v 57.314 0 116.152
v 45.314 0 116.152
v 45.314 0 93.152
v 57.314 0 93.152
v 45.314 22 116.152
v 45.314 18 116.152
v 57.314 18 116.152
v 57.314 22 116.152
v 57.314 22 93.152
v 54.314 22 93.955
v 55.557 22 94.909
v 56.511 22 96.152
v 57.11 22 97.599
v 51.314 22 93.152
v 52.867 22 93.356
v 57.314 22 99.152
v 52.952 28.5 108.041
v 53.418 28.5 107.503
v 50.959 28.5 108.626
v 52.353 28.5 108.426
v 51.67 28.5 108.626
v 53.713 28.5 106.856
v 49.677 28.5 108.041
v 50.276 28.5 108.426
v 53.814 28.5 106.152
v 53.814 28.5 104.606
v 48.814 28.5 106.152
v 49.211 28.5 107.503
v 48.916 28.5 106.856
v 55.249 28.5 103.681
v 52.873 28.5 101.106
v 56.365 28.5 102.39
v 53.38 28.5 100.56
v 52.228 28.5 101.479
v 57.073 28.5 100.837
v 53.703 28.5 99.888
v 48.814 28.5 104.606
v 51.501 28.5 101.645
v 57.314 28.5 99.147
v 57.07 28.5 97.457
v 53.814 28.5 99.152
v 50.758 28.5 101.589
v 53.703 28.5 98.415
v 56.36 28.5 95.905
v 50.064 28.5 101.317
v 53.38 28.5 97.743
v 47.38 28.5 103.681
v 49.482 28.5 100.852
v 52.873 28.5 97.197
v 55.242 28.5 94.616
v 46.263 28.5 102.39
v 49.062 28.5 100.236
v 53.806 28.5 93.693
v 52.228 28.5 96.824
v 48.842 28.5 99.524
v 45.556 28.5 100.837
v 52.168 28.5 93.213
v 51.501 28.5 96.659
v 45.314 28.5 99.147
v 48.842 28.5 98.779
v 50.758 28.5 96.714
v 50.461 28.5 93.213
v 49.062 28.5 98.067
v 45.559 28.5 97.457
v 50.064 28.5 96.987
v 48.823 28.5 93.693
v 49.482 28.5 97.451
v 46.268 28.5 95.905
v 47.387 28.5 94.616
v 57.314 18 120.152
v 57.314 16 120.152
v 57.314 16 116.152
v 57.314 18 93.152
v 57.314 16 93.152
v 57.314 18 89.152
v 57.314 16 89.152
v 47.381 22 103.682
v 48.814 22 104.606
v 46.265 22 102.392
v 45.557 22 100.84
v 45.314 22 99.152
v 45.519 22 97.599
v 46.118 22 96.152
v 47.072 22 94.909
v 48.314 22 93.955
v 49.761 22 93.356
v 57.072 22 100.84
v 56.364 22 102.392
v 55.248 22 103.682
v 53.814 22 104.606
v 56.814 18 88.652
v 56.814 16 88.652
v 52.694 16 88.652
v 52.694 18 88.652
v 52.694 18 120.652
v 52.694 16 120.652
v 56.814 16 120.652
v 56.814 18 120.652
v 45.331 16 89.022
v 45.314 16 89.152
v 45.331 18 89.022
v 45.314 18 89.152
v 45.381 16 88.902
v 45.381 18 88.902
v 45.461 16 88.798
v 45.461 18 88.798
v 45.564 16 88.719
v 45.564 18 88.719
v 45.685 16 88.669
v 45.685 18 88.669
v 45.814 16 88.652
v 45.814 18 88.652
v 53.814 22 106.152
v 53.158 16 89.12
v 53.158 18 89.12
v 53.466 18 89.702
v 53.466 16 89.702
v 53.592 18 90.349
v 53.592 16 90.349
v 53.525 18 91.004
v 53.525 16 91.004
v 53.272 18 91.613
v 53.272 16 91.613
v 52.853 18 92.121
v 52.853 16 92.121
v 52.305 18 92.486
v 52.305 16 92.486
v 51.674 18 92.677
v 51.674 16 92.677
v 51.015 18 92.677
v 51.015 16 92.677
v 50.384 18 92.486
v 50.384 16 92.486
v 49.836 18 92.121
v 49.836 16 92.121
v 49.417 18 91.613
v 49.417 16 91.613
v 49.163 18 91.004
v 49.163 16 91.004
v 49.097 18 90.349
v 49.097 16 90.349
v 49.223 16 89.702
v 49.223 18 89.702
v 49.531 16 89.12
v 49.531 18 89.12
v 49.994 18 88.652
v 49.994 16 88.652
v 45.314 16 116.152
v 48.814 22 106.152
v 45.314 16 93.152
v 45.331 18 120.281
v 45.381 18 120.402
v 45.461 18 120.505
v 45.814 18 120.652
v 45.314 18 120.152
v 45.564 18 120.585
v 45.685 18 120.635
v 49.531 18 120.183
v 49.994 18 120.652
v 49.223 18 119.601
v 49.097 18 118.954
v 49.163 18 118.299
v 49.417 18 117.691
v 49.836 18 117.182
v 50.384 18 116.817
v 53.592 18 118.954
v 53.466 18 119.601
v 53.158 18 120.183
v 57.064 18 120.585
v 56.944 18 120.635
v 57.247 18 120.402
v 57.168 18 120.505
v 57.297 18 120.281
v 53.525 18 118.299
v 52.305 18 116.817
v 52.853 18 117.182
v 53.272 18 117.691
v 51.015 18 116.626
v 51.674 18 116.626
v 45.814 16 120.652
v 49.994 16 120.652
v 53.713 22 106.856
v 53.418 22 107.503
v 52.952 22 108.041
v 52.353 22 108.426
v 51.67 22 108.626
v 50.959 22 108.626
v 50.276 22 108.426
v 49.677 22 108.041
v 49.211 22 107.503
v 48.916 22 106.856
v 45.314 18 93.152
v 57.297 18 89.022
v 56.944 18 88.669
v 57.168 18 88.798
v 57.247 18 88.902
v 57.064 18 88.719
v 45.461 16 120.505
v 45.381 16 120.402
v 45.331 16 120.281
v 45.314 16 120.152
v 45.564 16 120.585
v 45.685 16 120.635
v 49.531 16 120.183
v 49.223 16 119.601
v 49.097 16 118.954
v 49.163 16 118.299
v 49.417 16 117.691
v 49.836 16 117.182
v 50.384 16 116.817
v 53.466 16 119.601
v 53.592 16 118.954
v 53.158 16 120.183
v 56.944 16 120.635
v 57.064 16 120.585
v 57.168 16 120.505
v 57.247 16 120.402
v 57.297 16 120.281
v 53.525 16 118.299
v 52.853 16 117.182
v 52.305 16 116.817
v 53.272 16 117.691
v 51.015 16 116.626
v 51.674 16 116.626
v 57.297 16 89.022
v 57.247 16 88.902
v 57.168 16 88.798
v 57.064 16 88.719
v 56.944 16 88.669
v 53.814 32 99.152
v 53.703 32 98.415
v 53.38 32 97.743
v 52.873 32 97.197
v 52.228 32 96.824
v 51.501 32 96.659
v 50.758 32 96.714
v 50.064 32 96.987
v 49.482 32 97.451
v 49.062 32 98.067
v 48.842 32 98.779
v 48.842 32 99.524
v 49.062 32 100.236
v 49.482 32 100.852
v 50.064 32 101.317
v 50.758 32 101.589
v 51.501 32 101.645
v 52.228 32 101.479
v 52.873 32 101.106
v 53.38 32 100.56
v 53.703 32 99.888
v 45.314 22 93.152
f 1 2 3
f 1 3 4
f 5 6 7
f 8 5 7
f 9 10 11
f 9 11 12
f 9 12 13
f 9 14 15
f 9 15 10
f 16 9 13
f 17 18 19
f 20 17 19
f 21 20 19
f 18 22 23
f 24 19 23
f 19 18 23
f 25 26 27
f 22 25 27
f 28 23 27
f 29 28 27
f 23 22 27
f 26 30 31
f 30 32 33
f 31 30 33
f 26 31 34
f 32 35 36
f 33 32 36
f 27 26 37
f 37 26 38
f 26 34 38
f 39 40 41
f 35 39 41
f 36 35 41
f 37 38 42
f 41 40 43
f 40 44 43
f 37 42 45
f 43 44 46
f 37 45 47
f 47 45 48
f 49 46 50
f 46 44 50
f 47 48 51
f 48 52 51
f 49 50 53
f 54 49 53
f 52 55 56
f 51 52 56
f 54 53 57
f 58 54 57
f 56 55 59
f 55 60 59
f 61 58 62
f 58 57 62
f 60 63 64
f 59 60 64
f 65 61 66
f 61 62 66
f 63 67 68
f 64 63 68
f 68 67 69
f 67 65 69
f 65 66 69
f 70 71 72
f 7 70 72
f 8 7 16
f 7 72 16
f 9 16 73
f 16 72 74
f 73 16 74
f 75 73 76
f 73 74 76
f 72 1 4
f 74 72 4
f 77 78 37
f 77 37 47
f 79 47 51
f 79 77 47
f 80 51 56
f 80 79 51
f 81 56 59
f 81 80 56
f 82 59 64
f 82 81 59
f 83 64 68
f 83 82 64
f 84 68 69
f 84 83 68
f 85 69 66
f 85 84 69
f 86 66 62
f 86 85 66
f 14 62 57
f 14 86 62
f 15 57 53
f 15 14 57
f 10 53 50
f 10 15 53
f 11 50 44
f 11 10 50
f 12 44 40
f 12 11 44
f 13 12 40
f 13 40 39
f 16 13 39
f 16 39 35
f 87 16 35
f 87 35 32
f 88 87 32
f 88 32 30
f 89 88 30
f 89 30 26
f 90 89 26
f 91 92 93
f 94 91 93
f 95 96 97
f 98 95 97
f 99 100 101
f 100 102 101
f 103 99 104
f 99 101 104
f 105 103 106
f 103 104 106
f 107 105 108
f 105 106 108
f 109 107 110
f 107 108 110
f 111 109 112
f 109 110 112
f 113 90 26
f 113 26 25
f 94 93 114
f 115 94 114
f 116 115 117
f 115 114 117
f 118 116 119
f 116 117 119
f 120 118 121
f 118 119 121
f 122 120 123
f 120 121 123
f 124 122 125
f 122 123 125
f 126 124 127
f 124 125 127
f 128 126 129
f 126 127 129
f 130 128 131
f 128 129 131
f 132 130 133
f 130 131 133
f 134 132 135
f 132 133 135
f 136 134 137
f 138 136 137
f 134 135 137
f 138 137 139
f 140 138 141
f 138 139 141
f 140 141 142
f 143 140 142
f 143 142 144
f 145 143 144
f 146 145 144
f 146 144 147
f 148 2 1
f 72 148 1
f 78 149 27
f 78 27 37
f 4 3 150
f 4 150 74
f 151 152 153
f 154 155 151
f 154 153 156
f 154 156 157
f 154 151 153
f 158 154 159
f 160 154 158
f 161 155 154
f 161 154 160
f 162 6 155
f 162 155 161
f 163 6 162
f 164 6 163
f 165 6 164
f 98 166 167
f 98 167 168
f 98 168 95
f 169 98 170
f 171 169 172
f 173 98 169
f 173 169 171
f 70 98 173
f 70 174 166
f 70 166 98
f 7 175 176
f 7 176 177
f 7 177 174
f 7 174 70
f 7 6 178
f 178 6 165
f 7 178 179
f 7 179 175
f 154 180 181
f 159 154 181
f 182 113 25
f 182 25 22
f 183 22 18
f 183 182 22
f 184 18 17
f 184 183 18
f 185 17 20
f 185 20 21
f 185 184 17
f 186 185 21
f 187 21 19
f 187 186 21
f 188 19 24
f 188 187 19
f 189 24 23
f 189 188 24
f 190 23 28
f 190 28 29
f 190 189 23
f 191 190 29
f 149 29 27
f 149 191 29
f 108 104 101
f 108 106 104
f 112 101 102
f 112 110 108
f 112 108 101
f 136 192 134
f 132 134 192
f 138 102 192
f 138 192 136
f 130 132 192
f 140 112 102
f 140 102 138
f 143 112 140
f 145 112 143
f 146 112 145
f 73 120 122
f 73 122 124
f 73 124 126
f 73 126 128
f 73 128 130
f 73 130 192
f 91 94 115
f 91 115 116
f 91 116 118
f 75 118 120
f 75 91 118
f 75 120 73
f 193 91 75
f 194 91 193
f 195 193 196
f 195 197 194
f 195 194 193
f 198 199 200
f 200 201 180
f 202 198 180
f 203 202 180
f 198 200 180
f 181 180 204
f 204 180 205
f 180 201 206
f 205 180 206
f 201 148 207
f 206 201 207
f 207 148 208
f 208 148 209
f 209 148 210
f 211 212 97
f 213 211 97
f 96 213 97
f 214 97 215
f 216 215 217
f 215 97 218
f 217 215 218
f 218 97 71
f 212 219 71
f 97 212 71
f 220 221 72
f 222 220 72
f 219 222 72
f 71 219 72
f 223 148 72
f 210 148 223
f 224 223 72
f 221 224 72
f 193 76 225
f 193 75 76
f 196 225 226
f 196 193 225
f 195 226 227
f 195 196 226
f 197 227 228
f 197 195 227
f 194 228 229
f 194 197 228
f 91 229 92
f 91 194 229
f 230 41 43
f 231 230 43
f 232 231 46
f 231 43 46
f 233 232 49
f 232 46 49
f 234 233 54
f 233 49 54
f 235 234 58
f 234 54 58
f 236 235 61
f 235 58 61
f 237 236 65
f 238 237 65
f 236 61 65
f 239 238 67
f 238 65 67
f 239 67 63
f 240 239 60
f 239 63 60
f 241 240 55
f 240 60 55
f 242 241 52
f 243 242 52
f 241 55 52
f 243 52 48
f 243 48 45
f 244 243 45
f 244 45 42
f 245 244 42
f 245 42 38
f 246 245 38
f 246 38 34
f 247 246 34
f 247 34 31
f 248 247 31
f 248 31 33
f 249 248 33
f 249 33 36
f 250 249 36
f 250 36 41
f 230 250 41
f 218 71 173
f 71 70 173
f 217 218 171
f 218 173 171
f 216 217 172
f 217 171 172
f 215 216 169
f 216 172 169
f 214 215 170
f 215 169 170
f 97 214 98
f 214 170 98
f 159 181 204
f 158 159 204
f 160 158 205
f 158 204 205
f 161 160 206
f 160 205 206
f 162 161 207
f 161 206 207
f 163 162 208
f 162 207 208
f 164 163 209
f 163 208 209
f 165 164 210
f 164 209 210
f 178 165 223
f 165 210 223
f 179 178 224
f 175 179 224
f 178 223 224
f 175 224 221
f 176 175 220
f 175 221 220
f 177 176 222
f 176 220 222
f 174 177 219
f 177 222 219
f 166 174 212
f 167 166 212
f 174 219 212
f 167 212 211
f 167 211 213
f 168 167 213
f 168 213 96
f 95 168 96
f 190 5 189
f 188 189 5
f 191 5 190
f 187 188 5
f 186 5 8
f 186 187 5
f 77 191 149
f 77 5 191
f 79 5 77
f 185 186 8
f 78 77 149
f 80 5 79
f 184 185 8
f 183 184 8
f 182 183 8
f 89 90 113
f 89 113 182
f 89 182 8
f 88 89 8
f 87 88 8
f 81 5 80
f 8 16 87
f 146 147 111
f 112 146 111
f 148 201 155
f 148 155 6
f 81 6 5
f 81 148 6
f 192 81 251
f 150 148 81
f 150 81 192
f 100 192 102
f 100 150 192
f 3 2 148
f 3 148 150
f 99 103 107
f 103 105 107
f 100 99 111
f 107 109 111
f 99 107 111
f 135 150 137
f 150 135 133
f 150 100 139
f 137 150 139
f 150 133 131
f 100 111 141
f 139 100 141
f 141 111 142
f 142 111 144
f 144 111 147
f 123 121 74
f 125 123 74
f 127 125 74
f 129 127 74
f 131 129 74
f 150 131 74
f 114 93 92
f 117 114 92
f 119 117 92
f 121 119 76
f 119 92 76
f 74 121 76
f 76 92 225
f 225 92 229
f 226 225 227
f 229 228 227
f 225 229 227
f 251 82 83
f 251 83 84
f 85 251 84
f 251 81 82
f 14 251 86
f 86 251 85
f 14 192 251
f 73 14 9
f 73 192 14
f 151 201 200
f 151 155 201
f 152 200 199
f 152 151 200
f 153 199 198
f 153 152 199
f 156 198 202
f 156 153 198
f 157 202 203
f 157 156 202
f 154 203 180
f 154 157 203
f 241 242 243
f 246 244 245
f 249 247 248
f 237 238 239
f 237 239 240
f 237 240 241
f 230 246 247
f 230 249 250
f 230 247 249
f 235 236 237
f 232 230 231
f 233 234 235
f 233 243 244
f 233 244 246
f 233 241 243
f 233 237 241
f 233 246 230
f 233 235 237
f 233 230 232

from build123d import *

# Parameters (mm, degrees)
SKETCH4_R           = 2.5
BOSS_EXTRUDE2_DEPTH = 32
BOSS_EXTRUDE3_DEPTH = 28.5
SKETCH1_W           = 12
SKETCH1_H           = 23
BOSS_EXTRUDE4_DEPTH = 22
BOSS_EXTRUDE6_DEPTH = 2
FILLET2_R           = 0.5


with BuildPart() as part:
    # Sketch4 → Boss-Extrude2 (new body)
    with BuildSketch(Plane(origin=(0, 0, 0), x_dir=(1, 0, 0), z_dir=(0, 1, 0))):
        with Locations((51.314367453, -99.151596437)):
            Circle(SKETCH4_R)
    extrude(amount=BOSS_EXTRUDE2_DEPTH)

    # Sketch3 → Boss-Extrude3 (add)
    with BuildSketch(Plane(origin=(0, 0, 0), x_dir=(1, 0, 0), z_dir=(0, 1, 0))):
        with BuildLine():
            Line((48.814367453, -106.151596437), (48.814367453, -104.605952495))
            ThreePointArc((48.814367453, -104.605952495), (51.314367453, -93.151596437), (53.814367453, -104.605952495))
            Line((53.814367453, -104.605952495), (53.814367453, -106.151596437))
            ThreePointArc((53.814367453, -106.151596437), (51.314367453, -108.651596437), (48.814367453, -106.151596437))
        make_face()
    extrude(amount=BOSS_EXTRUDE3_DEPTH)

    # Sketch1 → Boss-Extrude4 (add)
    with BuildSketch(Plane(origin=(0, 0, 0), x_dir=(1, 0, 0), z_dir=(0, 1, 0))):
        with Locations((51.314367453, -104.651596437)):
            Rectangle(SKETCH1_W, SKETCH1_H)
    extrude(amount=BOSS_EXTRUDE4_DEPTH)

    # Sketch7 → Boss-Extrude6 (add)
    with BuildSketch(Plane(origin=(0, 16, 0), x_dir=(1, 0, 0), z_dir=(0, 1, 0))):
        with BuildLine():
            Line((52.694479243, -120.651596437), (57.314367453, -120.651596437))
            Line((57.314367453, -120.651596437), (57.314367453, -116.151596437))
            Line((57.314367453, -116.151596437), (45.314367453, -116.151596437))
            Line((45.314367453, -116.151596437), (45.314367453, -120.651596437))
            Line((45.314367453, -120.651596437), (49.994479243, -120.651596437))
            ThreePointArc((49.994479243, -120.651596437), (51.344479243, -116.601596437), (52.694479243, -120.651596437))
        make_face()
        with BuildLine():
            Line((45.314367453, -93.151596437), (57.314367453, -93.151596437))
            Line((57.314367453, -93.151596437), (57.314367453, -88.651596437))
            Line((57.314367453, -88.651596437), (52.694479243, -88.651596437))
            ThreePointArc((52.694479243, -88.651596437), (51.344479243, -92.701596437), (49.994479243, -88.651596437))
            Line((49.994479243, -88.651596437), (45.314367453, -88.651596437))
            Line((45.314367453, -88.651596437), (45.314367453, -93.151596437))
        make_face()
    extrude(amount=BOSS_EXTRUDE6_DEPTH)

    # Fillet2
    fillet2_edges = [part.edges().sort_by_distance(p)[0] for p in [
        (45.314367453, 17, 120.651596437),
        (57.314367453, 17, 120.651596437),
        (45.314367453, 17, 88.651596437),
        (57.314367453, 17, 88.651596437),
    ]]
    fillet(fillet2_edges, radius=FILLET2_R)


solid = part.part
